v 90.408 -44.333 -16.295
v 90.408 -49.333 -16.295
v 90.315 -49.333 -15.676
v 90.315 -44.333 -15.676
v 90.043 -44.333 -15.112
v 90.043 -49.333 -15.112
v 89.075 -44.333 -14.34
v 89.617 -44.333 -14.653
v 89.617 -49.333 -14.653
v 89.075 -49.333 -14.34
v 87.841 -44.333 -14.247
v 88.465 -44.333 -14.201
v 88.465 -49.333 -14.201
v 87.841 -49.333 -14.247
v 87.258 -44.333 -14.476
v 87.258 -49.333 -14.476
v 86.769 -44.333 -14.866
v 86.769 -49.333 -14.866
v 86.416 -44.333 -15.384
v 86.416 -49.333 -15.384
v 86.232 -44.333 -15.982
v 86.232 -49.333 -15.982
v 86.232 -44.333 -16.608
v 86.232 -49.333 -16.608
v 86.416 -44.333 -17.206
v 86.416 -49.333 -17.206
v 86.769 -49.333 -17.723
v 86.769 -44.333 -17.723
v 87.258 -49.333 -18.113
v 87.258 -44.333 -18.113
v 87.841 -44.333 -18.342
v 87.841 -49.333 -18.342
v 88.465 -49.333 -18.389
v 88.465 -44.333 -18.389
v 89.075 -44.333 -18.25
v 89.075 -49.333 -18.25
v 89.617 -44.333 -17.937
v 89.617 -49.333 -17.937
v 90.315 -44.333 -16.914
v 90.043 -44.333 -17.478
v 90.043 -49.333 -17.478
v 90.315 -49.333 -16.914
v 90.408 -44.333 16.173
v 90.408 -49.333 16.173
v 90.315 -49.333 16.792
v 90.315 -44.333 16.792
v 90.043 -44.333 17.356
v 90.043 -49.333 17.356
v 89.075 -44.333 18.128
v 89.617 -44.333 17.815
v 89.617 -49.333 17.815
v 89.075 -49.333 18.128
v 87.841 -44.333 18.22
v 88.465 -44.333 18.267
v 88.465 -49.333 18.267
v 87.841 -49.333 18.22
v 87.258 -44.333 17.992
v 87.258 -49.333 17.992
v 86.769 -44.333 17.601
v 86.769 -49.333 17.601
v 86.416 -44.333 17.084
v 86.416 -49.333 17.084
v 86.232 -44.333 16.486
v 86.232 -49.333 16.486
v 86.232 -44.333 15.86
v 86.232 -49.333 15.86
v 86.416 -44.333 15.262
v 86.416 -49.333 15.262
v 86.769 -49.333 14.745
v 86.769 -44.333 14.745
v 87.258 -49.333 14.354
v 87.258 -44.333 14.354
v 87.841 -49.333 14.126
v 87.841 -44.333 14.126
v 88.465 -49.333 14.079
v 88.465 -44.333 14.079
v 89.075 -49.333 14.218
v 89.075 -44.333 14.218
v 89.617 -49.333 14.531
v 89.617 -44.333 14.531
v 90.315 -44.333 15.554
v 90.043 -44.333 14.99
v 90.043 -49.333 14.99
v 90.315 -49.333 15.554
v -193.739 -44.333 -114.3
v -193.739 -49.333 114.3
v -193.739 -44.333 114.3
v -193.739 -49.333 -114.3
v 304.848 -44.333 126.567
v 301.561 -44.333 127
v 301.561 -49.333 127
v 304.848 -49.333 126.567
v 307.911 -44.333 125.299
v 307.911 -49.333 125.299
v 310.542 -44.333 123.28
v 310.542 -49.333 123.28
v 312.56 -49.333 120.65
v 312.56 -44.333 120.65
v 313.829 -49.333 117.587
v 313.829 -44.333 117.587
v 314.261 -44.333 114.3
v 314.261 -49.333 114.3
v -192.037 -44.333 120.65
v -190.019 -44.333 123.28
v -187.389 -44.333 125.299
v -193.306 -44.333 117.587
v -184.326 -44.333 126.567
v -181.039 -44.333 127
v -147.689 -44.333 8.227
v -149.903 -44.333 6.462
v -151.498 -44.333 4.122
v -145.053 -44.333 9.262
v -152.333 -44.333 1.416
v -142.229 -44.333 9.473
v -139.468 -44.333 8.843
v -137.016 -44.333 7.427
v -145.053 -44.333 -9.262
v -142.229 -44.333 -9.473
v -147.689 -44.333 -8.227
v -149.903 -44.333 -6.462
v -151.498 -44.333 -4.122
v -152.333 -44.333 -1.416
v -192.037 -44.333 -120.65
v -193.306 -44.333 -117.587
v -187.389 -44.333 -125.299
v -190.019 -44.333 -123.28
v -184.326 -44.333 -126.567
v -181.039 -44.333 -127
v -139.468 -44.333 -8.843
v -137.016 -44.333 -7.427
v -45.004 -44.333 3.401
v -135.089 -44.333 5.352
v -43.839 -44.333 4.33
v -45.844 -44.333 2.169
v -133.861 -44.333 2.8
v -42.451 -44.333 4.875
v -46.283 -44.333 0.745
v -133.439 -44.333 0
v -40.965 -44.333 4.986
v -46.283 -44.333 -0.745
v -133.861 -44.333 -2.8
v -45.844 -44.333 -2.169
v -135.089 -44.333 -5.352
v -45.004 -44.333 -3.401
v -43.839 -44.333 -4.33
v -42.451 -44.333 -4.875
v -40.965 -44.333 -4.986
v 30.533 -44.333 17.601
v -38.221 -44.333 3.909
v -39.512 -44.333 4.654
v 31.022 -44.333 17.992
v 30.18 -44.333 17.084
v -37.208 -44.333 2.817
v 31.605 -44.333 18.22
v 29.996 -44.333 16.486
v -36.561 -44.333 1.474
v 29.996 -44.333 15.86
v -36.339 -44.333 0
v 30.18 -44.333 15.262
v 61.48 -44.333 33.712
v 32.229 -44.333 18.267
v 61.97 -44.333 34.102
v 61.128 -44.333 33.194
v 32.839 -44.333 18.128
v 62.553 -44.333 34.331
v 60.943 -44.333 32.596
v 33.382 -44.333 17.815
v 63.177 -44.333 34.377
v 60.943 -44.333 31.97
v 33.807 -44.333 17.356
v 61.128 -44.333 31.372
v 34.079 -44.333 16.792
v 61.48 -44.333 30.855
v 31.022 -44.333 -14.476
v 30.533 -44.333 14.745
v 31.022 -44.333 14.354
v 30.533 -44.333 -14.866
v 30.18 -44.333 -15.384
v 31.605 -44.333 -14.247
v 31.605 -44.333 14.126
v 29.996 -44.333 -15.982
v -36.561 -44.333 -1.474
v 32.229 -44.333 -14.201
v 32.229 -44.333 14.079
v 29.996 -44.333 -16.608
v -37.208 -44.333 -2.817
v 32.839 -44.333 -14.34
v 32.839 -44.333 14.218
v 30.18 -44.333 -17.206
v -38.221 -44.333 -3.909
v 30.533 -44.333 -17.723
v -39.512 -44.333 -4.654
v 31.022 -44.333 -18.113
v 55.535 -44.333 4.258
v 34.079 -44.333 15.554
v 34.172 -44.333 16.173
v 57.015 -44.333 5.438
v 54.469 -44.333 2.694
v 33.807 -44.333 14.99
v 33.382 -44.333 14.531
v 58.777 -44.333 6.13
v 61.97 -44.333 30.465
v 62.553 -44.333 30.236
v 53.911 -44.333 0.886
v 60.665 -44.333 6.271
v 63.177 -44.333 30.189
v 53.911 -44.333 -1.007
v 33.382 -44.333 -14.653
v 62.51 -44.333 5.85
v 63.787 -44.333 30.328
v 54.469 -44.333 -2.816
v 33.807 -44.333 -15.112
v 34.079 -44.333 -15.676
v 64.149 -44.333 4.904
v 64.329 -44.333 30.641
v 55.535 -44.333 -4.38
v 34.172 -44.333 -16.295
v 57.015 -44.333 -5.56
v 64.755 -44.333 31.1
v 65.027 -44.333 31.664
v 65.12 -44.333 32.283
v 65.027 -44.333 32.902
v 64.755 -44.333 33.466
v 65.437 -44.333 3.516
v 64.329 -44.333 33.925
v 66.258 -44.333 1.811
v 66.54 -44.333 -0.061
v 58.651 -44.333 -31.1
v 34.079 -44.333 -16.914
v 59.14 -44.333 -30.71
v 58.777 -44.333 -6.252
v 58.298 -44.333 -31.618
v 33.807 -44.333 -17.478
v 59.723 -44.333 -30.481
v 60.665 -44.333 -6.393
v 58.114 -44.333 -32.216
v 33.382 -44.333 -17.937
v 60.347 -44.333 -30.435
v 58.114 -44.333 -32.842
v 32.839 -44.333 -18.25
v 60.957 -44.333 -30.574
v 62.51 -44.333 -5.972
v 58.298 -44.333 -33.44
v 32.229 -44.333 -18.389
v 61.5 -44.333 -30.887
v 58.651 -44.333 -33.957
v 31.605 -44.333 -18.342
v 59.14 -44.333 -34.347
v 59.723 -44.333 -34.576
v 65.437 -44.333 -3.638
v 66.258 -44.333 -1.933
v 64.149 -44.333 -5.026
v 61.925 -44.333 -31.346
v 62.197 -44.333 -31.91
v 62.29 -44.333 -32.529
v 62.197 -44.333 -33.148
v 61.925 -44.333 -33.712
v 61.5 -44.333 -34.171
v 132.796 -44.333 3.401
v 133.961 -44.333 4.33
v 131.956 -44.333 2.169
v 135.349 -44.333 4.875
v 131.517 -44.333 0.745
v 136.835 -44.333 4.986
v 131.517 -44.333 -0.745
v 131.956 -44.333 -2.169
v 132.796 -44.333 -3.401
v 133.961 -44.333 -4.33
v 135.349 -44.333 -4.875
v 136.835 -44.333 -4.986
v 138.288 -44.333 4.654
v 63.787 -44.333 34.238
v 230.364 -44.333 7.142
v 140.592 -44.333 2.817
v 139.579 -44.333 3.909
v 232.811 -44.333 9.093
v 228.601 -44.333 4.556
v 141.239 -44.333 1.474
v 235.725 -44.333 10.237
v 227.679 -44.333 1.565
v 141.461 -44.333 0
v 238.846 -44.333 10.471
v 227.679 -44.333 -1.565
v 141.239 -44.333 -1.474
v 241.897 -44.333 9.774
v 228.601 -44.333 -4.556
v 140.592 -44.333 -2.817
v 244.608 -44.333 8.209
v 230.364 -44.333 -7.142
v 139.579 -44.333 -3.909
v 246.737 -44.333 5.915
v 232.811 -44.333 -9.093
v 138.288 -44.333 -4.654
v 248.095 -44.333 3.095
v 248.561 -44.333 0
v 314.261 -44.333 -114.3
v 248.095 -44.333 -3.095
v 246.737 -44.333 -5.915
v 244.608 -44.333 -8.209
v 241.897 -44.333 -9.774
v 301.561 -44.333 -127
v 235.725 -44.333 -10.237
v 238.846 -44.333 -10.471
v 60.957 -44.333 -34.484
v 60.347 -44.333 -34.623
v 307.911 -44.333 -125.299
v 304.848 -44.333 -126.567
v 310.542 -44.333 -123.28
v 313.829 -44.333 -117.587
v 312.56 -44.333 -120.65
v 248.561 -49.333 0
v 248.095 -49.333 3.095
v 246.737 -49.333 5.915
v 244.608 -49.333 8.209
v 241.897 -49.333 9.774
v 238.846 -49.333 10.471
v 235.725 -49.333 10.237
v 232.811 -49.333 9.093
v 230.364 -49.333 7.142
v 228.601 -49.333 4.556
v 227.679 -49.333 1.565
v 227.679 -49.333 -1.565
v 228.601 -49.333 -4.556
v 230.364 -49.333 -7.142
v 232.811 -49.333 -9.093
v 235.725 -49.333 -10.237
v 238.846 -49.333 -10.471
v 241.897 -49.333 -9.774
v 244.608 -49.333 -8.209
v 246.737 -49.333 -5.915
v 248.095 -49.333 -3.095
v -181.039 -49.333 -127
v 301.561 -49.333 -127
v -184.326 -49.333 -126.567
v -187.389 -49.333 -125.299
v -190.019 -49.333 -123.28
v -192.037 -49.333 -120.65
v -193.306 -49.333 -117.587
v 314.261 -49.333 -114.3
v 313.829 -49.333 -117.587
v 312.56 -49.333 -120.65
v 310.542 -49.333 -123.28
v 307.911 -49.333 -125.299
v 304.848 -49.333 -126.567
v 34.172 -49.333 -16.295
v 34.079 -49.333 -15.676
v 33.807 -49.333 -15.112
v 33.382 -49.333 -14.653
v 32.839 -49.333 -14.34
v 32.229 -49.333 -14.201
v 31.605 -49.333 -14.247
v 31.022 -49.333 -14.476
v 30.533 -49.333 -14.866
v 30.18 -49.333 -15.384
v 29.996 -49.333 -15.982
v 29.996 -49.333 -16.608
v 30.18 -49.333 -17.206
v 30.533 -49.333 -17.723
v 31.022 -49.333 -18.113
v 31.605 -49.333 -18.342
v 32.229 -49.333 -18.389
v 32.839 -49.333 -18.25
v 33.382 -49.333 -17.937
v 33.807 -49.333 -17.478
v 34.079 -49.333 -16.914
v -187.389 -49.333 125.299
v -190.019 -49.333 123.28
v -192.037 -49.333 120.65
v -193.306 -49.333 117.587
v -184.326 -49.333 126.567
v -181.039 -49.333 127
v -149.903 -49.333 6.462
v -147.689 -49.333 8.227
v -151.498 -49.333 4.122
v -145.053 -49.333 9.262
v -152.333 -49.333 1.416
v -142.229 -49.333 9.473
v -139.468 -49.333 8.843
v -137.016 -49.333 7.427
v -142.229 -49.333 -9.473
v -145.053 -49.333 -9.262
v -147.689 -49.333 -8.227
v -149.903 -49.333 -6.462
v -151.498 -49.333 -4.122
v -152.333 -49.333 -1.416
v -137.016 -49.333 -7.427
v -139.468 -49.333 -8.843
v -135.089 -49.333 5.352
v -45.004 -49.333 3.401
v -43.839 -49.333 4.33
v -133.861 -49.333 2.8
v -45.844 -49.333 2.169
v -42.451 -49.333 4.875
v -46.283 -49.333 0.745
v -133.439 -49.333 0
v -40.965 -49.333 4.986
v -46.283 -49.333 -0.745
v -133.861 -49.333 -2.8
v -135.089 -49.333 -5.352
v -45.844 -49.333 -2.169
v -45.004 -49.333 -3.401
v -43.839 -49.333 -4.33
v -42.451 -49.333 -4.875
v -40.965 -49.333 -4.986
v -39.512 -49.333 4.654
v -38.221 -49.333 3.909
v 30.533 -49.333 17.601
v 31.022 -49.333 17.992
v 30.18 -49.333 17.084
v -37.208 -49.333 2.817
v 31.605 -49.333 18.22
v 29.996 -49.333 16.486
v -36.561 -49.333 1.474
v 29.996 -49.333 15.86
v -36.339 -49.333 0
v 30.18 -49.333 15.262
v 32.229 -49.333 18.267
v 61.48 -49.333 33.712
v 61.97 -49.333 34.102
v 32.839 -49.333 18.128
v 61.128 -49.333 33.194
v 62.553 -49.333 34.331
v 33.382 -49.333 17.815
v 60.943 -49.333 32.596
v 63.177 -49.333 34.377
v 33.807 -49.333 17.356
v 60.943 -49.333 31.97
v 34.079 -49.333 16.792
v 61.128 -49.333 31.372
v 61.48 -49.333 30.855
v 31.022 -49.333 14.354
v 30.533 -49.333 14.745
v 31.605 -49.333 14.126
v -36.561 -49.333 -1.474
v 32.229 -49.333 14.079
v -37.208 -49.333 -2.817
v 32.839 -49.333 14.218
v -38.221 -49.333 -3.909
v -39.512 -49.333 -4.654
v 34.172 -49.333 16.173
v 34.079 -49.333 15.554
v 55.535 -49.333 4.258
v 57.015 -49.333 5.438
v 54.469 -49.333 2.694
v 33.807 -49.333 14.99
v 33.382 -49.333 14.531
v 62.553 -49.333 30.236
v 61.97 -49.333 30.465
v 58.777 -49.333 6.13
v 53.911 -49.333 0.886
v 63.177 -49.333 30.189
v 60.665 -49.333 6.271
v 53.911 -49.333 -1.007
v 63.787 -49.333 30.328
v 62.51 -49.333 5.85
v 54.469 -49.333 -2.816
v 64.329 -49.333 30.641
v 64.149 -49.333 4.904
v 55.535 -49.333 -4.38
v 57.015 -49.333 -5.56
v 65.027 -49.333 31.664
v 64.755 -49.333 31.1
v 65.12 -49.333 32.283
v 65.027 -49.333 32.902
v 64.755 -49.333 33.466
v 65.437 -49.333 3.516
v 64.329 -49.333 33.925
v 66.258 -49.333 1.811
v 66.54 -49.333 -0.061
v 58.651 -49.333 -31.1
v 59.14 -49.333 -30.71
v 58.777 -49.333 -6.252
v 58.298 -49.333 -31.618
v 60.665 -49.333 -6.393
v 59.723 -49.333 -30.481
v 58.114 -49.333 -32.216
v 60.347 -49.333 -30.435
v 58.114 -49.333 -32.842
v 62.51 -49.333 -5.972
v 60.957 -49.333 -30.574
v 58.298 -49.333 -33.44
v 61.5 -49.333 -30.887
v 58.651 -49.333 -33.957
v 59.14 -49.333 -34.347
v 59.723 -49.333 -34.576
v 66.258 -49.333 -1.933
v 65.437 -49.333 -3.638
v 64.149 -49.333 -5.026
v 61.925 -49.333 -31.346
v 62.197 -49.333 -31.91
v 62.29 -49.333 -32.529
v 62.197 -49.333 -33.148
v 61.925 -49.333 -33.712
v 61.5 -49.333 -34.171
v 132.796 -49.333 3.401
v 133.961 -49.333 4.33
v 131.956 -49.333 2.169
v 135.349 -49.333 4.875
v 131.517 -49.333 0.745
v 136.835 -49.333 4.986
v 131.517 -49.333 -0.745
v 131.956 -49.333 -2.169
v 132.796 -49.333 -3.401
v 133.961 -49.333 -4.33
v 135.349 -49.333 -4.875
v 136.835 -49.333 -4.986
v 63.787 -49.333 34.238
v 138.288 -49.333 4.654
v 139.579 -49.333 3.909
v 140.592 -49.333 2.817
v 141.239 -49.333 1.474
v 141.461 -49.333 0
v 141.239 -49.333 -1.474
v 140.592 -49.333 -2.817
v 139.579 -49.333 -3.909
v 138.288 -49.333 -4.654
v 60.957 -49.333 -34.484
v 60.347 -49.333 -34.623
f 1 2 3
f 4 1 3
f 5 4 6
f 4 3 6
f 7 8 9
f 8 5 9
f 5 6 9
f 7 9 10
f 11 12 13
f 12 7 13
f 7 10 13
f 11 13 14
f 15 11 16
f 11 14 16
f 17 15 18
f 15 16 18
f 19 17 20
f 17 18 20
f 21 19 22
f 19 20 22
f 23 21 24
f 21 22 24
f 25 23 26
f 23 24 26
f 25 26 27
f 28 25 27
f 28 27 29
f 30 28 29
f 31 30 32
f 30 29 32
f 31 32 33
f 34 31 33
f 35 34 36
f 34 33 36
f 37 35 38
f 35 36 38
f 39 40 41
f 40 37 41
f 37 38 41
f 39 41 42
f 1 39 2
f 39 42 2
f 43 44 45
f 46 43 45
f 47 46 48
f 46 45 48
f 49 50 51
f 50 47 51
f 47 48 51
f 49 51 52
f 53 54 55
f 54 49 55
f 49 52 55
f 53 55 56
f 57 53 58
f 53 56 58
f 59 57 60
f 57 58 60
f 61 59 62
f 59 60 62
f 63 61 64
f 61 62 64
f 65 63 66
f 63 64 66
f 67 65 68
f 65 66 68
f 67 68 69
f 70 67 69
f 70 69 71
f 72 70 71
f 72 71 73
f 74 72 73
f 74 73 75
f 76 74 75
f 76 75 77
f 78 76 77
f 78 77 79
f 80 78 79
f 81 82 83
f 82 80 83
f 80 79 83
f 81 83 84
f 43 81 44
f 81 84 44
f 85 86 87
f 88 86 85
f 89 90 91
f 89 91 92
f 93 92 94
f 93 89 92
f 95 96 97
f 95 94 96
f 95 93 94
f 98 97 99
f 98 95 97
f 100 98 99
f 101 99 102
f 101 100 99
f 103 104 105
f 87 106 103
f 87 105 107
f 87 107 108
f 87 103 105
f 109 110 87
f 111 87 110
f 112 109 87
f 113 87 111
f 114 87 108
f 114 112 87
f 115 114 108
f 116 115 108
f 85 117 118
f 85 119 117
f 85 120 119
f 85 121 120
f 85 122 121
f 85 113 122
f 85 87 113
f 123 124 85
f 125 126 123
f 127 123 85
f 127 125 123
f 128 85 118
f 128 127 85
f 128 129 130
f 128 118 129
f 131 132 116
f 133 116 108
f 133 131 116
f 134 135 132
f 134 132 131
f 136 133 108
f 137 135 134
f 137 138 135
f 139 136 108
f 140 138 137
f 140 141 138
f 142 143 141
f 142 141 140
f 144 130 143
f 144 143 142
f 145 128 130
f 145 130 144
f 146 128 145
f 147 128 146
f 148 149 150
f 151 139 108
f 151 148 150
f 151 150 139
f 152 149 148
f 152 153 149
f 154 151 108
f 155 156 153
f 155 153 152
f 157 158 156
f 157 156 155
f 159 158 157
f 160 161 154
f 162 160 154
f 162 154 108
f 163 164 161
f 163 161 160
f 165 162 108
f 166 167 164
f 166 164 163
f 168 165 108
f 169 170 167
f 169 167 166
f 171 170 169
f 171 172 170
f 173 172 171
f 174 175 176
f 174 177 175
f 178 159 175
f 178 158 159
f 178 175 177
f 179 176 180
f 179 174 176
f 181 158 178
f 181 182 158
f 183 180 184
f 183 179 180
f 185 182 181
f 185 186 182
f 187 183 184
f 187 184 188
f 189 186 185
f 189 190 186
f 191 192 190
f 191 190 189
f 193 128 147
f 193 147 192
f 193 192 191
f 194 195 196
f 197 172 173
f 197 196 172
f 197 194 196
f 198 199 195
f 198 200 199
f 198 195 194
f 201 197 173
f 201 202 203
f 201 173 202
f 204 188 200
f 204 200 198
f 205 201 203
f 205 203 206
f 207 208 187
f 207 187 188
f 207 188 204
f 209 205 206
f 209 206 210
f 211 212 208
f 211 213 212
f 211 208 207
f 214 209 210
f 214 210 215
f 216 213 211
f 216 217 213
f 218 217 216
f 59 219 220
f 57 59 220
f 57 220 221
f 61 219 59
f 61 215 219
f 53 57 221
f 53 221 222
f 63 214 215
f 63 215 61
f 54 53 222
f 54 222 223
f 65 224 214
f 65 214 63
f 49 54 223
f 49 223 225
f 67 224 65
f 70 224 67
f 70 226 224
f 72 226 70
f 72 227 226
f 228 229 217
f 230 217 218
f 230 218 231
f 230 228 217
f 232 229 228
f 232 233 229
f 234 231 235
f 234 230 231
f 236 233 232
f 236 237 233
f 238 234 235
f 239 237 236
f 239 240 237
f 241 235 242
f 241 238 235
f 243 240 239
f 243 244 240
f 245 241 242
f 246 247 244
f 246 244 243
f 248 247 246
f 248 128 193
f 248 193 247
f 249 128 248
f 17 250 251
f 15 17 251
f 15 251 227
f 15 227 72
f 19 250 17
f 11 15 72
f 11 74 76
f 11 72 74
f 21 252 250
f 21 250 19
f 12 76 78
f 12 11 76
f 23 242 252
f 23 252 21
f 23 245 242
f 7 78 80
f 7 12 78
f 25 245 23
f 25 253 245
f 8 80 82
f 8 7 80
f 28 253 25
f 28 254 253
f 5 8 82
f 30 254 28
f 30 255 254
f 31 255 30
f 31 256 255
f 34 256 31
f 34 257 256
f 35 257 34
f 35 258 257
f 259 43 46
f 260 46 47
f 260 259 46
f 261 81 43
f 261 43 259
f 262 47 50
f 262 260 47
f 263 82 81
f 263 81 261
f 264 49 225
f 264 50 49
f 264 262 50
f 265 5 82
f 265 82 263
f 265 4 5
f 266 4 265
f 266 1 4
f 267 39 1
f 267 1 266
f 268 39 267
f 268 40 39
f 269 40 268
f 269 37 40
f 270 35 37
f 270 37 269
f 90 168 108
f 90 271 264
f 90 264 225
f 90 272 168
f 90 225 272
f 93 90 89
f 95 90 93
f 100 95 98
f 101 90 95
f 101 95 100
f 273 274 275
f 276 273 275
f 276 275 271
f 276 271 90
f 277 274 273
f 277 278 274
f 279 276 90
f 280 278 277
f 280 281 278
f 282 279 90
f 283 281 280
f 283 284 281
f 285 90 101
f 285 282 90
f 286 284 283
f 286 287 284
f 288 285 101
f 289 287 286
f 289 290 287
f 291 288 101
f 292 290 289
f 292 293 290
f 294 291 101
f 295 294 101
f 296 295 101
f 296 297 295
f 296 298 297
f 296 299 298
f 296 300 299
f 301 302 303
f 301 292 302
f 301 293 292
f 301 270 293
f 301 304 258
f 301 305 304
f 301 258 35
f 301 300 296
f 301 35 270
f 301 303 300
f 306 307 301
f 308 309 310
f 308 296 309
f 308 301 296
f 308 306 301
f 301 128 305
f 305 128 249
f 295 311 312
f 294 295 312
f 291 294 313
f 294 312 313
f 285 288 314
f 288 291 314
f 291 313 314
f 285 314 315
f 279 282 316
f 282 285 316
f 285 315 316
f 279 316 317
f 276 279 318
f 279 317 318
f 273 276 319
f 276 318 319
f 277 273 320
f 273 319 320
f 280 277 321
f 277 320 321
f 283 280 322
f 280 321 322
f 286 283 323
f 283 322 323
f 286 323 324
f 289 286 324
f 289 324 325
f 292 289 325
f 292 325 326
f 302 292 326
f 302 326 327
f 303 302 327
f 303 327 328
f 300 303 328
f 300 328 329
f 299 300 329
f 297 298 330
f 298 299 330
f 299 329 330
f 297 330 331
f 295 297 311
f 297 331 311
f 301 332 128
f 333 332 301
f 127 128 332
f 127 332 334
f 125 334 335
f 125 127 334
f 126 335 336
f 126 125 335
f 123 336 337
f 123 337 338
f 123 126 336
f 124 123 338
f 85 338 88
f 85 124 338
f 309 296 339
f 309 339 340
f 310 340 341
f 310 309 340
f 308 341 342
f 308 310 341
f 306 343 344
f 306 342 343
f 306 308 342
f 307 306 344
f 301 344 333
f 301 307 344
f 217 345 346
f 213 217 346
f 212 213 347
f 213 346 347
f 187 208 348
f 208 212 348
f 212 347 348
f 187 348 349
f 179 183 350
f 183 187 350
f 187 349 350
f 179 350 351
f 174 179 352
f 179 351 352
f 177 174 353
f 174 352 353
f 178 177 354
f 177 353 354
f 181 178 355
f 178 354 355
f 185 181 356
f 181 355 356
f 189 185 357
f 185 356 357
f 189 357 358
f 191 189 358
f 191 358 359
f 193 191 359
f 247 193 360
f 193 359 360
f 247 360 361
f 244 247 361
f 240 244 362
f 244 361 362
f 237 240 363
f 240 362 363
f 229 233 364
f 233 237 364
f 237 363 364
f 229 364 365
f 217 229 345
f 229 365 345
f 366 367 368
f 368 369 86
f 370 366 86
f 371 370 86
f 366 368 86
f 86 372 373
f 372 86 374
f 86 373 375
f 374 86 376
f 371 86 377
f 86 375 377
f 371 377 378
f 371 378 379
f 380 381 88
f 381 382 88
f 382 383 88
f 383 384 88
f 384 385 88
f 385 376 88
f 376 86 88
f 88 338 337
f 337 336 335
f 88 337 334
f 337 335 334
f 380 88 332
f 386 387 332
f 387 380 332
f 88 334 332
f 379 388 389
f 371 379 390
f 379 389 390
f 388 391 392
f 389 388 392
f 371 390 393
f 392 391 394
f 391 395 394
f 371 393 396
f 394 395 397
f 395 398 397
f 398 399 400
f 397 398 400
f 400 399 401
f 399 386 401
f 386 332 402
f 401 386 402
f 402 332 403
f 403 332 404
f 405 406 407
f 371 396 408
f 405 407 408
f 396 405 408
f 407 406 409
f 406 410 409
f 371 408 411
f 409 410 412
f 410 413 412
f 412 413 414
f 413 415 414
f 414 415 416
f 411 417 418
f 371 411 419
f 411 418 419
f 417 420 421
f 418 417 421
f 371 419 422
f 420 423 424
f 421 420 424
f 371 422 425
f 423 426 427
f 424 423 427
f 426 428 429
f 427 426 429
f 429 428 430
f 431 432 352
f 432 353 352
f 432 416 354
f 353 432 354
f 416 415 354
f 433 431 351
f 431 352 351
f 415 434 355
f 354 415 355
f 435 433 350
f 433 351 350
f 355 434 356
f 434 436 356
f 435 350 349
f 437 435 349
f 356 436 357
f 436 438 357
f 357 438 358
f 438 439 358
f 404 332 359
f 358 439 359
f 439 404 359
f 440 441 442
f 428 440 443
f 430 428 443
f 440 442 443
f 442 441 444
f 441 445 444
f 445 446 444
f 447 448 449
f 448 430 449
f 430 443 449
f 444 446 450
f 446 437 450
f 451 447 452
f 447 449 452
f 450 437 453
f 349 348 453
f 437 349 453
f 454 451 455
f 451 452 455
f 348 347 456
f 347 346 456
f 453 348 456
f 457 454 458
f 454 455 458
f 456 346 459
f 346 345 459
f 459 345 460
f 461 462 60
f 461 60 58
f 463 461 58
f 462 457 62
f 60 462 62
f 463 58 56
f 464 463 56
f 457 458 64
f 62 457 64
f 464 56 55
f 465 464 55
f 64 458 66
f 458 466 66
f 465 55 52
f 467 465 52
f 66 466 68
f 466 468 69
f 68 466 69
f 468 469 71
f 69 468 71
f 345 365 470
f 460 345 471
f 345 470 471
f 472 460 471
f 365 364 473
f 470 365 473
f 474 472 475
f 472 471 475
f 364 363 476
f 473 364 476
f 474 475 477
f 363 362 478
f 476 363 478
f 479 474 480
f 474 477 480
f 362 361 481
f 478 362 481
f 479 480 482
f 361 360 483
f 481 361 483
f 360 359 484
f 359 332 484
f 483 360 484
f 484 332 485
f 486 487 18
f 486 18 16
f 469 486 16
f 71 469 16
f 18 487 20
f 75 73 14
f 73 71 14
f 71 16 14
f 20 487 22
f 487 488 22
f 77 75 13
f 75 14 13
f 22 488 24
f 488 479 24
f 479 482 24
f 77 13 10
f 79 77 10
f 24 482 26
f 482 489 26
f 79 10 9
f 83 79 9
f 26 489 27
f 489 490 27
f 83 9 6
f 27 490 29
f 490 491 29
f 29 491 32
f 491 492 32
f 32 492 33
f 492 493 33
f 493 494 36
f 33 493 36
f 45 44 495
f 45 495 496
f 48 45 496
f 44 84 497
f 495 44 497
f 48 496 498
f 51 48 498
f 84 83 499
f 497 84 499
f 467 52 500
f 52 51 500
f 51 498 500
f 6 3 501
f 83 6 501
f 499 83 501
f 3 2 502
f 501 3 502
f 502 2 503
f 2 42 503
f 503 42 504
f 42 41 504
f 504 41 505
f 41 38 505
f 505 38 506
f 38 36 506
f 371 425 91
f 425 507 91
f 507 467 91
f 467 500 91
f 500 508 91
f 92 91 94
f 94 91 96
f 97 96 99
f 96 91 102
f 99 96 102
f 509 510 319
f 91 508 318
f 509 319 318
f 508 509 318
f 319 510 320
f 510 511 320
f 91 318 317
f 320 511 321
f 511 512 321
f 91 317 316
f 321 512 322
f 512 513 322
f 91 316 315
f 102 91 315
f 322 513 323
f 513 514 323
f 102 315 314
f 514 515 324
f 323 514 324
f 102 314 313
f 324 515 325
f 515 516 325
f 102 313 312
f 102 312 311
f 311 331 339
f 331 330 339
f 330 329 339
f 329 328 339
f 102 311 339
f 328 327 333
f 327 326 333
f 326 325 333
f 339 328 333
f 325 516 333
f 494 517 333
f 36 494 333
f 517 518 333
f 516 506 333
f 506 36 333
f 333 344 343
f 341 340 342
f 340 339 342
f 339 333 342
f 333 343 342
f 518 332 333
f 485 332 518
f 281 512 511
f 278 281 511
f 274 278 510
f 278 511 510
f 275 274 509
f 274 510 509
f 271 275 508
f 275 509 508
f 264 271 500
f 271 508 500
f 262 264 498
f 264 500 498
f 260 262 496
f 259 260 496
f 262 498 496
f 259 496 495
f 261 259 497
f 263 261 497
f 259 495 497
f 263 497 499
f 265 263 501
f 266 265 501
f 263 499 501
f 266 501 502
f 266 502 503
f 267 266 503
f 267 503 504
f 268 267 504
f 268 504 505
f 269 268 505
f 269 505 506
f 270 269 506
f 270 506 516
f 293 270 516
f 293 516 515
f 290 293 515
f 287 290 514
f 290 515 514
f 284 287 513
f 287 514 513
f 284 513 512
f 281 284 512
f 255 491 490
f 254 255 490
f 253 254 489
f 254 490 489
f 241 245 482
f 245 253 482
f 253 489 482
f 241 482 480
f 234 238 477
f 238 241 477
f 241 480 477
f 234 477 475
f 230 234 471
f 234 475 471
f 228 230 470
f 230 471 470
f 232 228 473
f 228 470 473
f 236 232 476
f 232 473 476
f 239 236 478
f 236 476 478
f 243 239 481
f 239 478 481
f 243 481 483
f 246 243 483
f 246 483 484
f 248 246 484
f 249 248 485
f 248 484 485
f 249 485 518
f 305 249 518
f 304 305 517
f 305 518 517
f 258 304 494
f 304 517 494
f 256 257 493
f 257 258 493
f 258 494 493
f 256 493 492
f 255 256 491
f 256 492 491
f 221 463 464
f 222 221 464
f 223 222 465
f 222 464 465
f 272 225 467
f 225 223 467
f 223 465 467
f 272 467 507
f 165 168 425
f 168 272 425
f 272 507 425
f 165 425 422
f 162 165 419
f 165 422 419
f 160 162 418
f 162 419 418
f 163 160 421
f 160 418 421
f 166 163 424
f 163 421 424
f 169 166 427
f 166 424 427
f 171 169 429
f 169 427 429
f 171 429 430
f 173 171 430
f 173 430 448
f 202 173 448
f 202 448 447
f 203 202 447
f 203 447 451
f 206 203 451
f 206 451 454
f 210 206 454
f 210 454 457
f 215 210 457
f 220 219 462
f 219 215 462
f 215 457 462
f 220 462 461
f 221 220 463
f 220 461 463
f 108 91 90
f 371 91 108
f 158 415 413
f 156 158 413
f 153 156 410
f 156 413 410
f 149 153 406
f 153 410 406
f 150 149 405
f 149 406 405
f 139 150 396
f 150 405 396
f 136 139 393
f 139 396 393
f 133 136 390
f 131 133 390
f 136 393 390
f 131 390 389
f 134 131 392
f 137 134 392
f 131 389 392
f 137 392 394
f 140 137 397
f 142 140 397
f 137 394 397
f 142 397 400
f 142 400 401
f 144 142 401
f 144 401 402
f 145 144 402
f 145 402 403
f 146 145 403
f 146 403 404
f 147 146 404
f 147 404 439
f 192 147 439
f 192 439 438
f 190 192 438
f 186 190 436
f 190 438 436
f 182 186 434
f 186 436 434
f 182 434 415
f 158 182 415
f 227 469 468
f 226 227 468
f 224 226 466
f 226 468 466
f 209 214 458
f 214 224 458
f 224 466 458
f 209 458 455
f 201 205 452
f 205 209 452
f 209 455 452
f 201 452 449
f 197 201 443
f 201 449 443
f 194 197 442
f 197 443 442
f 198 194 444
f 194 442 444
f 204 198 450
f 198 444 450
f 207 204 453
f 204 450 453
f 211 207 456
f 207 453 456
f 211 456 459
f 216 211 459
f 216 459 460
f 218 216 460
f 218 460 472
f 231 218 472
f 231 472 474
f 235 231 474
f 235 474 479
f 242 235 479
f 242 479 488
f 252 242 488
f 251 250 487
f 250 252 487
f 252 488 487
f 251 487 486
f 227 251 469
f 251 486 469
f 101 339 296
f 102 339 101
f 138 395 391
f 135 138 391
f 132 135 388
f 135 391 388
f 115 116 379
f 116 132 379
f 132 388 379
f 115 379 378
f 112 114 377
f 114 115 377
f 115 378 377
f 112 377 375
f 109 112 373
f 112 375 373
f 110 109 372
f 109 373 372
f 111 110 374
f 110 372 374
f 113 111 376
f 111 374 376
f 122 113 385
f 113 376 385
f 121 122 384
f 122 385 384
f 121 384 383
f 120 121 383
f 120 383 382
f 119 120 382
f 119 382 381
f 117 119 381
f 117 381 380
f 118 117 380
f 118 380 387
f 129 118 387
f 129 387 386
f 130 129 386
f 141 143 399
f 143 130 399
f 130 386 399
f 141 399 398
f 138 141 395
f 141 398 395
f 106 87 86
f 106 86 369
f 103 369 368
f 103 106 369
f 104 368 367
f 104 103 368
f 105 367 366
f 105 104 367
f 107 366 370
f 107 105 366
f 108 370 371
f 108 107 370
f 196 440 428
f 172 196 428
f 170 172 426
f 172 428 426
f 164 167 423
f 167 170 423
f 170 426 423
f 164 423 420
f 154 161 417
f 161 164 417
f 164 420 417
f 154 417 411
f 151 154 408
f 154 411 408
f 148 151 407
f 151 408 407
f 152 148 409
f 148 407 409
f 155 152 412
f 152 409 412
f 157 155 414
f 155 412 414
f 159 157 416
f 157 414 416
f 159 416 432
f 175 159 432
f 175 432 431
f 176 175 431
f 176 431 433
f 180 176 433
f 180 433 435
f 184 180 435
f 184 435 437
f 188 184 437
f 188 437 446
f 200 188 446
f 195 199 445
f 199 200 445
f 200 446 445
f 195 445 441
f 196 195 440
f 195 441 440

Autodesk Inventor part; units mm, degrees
ref_plane "YZ Plane" through (0, 0, 0) normal (1, 0, 0) x (0, 1, 0)
ref_plane "XZ Plane" through (0, 0, 0) normal (0, 1, 0) x (-1, 0, 0)
ref_plane "Work Plane4" through (60.2613, -49.3334, 0) normal (0, 1, 0) x (1, 0, 0)
sketch "dimensions" plane through (60.2613, -49.3334, 0) normal (0, 1, 0) x (1, 0, 0)
  line L0 (-254, 127) -> (254, 127)
  line L1 (254, 127) -> (254, -127)
  line L2 (254, -127) -> (-254, -127)
  line L3 (-254, -127) -> (-254, 127)
  line L4 (-254, 127) -> (254, -127) construction
  line L5 (254, 127) -> (-254, -127) construction
  line L6 (-254, 0) -> (254, 0) construction
  circle A0 centre (177.8, 0) radius 10.5
  circle A1 centre (177.8, 0) radius 47.15 construction
  circle A2 centre (-203.2, 0) radius 9.5
  circle A3 centre (-203.2, 0) radius 23.9 construction
  circle A4 centre (2.7586, -32.2833) radius 2.1
  circle A5 centre (28.0468, -16.173) radius 2.1
  circle A6 centre (28.0468, 16.2948) radius 2.1
  circle A7 centre (-0.0711, 32.5287) radius 2.1
  circle A8 centre (-28.1891, 16.2948) radius 2.1
  circle A9 centre (-28.1891, -16.173) radius 2.1
  circle A10 centre (-0.0711, 0.0609) radius 6.35
  line L7 (177.8, 0) -> (-203.2, 0) construction
  circle A11 centre (76.2, 0) radius 5
  circle A12 centre (-101.6, 0) radius 5
  dimension "d1" = 508
  dimension "d2" = 254
  dimension "d3" = 21
  dimension "d4" = 94.3
  dimension "d6" = 19
  dimension "d7" = 47.8
  dimension "d32" = 10
  dimension "d34" = 101.6
  dimension "d35" = 10
  dimension "d36" = 101.6
extrude "Extrusion5" add sketch "dimensions" along normal blind 5 contours L0 L1 L2 L3 | A11 | A12
fillet "Fillet6" radius 12.7 4 edges at (314.2613, -46.8334, -127) (-193.7387, -46.8334, -127) (-193.7387, -46.8334, 127) (314.2613, -46.8334, 127)
extrude "Extrusion6" cut sketch "dimensions" along normal up to next contours A11 | A12
equation "\"d37\" = d36"
properties part number "antenna-mount"
